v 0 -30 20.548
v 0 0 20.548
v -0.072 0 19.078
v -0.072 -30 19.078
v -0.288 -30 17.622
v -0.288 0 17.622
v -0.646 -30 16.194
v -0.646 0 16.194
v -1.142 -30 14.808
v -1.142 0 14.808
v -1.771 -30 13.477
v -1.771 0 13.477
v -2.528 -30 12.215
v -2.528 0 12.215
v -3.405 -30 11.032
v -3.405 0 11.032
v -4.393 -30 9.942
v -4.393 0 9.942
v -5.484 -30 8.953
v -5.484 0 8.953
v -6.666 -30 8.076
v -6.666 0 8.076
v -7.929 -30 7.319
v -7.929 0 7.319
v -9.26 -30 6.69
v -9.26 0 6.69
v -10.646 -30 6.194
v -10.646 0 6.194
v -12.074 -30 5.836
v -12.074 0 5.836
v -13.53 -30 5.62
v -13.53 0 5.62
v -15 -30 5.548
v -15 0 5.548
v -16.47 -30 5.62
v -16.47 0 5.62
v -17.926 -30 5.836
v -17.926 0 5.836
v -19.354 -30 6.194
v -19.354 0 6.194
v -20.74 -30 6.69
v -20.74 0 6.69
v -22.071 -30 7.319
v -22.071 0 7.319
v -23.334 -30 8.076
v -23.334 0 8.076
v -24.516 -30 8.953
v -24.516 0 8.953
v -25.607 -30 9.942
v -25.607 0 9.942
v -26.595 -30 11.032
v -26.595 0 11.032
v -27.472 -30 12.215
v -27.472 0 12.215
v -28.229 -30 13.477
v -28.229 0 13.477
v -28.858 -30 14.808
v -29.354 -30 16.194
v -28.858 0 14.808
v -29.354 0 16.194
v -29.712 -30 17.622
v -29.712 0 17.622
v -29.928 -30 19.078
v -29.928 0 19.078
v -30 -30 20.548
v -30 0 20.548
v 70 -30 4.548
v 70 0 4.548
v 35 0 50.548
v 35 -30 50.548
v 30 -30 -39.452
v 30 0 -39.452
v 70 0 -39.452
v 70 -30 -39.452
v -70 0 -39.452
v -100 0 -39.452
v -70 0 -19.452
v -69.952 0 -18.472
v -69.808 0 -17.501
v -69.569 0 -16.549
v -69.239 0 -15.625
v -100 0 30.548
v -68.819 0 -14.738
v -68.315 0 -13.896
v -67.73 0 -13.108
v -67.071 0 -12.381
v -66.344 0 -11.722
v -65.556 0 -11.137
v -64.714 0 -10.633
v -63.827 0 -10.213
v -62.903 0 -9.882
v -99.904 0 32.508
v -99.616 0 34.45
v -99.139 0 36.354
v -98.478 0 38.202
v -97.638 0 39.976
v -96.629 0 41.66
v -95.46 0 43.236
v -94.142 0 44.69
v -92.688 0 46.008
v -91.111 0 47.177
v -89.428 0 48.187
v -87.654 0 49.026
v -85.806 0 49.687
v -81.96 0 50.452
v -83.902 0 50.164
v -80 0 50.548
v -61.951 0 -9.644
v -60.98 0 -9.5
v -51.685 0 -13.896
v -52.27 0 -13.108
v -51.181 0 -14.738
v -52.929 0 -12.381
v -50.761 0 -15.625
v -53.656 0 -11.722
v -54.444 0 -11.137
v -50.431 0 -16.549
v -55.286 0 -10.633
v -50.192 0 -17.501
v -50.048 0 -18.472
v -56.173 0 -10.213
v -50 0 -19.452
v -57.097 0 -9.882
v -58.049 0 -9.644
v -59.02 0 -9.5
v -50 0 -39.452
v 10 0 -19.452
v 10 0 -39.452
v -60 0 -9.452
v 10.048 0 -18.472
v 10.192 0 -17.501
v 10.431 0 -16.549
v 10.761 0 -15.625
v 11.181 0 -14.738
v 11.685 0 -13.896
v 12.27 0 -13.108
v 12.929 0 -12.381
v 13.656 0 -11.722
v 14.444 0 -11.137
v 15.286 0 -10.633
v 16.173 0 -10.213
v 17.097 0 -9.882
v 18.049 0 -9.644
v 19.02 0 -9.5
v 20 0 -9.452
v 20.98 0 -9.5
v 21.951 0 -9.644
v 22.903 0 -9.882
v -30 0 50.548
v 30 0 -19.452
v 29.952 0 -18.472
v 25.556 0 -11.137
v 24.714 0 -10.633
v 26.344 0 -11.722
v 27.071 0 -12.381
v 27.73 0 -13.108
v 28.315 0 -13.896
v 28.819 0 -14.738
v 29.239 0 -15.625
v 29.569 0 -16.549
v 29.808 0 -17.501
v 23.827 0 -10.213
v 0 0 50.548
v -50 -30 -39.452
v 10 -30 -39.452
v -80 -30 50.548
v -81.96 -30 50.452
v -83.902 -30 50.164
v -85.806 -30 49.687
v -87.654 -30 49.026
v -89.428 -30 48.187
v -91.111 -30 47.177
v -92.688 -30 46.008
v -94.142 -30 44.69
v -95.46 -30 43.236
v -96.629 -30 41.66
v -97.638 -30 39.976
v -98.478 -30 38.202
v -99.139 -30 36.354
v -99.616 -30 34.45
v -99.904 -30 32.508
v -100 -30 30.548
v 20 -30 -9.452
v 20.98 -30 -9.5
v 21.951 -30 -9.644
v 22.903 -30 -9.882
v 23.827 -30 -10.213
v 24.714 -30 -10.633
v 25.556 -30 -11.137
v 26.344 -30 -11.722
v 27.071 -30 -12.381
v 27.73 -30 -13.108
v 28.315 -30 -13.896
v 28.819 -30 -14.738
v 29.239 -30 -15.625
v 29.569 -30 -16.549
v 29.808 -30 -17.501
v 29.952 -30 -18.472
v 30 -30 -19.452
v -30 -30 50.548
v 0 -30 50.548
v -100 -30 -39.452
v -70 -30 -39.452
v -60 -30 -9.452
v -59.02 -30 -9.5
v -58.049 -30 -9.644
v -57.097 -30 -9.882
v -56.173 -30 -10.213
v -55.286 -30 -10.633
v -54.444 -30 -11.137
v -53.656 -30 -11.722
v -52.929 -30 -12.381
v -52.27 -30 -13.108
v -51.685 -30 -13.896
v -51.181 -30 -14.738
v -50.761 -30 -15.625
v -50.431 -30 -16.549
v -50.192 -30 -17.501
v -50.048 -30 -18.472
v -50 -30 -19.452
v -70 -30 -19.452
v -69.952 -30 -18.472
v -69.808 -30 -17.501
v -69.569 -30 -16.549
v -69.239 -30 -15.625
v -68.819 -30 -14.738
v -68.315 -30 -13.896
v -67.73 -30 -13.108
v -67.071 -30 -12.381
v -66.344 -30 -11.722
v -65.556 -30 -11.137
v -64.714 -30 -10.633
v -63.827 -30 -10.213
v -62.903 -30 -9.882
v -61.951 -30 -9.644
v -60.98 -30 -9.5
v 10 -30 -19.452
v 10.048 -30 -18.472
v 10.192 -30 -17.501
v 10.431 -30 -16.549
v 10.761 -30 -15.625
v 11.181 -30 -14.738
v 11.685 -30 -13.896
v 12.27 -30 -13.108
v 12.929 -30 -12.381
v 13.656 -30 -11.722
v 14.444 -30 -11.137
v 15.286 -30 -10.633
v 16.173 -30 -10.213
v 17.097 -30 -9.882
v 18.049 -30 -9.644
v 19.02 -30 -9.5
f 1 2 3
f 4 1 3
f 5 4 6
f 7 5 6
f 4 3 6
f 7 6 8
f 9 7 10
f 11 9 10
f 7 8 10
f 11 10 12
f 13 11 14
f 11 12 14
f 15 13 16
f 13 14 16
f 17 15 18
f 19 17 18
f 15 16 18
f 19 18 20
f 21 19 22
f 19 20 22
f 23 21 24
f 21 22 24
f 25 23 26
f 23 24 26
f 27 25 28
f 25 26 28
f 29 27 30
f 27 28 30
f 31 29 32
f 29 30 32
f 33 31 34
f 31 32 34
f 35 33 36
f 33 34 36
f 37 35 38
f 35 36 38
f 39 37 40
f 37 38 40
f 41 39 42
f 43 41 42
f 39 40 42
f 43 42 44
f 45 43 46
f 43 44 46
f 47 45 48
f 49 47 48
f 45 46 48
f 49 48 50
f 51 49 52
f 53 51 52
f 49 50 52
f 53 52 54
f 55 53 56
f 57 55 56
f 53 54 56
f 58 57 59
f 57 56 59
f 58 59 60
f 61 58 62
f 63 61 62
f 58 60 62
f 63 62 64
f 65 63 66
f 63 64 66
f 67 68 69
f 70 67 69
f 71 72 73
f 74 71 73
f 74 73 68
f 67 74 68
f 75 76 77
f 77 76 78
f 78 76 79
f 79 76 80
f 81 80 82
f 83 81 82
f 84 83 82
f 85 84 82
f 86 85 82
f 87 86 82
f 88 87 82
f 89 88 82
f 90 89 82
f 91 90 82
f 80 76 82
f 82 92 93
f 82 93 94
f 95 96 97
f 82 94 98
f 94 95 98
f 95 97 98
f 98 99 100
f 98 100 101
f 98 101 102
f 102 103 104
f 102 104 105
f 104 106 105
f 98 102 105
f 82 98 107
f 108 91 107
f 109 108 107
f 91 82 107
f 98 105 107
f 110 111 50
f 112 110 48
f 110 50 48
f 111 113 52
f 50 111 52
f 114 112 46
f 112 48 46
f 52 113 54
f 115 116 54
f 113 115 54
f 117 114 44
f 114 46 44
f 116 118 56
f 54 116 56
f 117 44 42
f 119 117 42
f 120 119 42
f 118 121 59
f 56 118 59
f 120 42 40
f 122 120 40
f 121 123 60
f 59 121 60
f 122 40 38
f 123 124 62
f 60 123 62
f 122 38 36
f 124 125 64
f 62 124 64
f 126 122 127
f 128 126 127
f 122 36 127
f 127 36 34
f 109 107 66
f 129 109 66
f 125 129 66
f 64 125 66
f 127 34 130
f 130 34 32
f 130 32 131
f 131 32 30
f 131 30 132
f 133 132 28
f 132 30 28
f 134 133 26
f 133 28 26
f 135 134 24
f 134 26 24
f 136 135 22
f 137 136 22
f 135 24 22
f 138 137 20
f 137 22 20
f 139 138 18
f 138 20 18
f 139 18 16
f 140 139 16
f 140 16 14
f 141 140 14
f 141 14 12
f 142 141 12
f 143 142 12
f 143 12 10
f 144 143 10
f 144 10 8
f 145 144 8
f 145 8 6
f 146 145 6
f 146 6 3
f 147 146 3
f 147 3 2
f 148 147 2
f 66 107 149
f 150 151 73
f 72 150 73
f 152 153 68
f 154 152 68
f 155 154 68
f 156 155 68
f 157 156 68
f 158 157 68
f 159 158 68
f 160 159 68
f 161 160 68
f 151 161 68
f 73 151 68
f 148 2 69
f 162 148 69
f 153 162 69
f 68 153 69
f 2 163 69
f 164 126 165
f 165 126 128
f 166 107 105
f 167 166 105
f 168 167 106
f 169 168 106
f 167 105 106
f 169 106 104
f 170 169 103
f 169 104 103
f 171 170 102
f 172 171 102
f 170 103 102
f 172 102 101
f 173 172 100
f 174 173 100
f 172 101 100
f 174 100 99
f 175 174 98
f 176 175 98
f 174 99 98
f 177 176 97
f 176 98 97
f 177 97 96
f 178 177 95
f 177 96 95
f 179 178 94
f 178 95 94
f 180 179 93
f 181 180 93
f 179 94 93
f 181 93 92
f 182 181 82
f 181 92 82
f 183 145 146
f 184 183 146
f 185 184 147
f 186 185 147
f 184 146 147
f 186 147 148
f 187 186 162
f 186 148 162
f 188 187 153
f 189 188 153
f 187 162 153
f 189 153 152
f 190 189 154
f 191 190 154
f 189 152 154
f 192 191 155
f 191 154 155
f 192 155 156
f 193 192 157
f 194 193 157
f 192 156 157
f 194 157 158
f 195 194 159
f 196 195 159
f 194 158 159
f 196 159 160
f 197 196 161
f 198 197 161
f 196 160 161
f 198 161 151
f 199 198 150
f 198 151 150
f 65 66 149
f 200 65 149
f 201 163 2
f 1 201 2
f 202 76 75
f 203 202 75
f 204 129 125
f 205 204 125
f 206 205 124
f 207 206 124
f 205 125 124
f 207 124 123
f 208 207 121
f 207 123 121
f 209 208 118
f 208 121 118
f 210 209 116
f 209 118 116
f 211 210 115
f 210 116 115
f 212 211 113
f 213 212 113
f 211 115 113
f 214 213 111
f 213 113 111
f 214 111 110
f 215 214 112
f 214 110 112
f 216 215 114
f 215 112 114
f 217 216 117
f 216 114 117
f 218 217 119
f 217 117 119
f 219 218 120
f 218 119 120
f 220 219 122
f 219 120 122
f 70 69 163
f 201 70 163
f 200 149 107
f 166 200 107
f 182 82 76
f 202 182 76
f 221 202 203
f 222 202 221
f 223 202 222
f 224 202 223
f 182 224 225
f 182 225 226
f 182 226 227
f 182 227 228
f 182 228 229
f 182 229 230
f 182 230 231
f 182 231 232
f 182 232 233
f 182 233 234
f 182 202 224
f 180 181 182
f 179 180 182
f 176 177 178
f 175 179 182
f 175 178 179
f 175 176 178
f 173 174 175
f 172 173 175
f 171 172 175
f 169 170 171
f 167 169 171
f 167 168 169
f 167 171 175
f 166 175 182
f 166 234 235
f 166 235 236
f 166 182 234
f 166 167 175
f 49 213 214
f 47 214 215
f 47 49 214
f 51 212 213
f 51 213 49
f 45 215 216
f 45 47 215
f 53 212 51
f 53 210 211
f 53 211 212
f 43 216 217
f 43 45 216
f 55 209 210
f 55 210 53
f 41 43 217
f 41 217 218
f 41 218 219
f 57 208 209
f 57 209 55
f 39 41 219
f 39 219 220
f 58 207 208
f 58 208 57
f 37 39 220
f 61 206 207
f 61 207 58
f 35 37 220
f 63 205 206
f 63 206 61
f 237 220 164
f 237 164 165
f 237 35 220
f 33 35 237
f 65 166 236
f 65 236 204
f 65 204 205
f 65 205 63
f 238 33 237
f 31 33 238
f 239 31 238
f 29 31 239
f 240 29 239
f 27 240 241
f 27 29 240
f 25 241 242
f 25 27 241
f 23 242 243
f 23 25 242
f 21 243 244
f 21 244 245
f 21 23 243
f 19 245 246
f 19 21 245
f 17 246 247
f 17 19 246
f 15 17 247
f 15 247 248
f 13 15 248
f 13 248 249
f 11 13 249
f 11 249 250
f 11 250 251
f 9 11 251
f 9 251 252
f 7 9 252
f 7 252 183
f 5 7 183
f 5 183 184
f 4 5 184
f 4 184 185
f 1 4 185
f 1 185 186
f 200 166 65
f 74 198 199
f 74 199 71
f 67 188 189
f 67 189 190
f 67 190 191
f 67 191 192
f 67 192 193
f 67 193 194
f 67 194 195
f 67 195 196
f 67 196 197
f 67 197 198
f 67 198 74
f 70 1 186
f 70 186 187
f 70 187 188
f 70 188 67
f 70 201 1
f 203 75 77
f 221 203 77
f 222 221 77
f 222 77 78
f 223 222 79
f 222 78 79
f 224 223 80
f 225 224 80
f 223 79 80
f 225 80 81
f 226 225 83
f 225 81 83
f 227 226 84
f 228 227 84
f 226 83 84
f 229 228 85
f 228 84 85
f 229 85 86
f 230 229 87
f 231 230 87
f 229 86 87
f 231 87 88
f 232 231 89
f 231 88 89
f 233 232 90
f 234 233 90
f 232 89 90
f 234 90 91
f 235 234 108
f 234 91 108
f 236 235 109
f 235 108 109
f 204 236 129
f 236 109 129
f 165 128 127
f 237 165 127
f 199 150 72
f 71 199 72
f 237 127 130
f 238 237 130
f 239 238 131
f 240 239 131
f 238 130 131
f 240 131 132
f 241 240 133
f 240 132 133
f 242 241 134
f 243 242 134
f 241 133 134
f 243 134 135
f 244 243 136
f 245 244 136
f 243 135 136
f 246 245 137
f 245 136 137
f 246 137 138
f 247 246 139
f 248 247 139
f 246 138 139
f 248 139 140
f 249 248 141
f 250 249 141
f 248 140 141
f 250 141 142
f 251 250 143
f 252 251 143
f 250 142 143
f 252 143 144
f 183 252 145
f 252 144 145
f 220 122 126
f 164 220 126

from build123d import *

# Parameters (mm, degrees)
F1_DEPTH = 30


with BuildPart() as f1:
    # F0 (on Front) → F1 (new body)
    with BuildSketch(Plane.XZ):
        with BuildLine():
            Line((-100, 30.548105), (-100, -39.451895))
            Line((-100, -39.451895), (-70, -39.451895))
            Line((-70, -39.451895), (-70, -19.451895))
            ThreePointArc((-70, -19.451895), (-67.071068, -12.380827), (-60, -9.451895))
            ThreePointArc((-60, -9.451895), (-52.928932, -12.380827), (-50, -19.451895))
            Line((-50, -19.451895), (-50, -39.451895))
            Line((-50, -39.451895), (10, -39.451895))
            Line((10, -39.451895), (10, -19.451895))
            ThreePointArc((10, -19.451895), (12.928932, -12.380827), (20, -9.451895))
            ThreePointArc((20, -9.451895), (27.071068, -12.380827), (30, -19.451895))
            Line((30, -19.451895), (30, -39.451895))
            Line((30, -39.451895), (70, -39.451895))
            Line((70, -39.451895), (70, 4.548105))
            Line((70, 4.548105), (35, 50.548105))
            Line((35, 50.548105), (0, 50.548105))
            Line((0, 50.548105), (0, 20.548105))
            ThreePointArc((0, 20.548105), (-15, 5.548105), (-30, 20.548105))
            Line((-30, 20.548105), (-30, 50.548105))
            Line((-30, 50.548105), (-80, 50.548105))
            ThreePointArc((-80, 50.548105), (-94.142136, 44.69024), (-100, 30.548105))
        make_face()
    extrude(amount=F1_DEPTH)


solid = f1.part
